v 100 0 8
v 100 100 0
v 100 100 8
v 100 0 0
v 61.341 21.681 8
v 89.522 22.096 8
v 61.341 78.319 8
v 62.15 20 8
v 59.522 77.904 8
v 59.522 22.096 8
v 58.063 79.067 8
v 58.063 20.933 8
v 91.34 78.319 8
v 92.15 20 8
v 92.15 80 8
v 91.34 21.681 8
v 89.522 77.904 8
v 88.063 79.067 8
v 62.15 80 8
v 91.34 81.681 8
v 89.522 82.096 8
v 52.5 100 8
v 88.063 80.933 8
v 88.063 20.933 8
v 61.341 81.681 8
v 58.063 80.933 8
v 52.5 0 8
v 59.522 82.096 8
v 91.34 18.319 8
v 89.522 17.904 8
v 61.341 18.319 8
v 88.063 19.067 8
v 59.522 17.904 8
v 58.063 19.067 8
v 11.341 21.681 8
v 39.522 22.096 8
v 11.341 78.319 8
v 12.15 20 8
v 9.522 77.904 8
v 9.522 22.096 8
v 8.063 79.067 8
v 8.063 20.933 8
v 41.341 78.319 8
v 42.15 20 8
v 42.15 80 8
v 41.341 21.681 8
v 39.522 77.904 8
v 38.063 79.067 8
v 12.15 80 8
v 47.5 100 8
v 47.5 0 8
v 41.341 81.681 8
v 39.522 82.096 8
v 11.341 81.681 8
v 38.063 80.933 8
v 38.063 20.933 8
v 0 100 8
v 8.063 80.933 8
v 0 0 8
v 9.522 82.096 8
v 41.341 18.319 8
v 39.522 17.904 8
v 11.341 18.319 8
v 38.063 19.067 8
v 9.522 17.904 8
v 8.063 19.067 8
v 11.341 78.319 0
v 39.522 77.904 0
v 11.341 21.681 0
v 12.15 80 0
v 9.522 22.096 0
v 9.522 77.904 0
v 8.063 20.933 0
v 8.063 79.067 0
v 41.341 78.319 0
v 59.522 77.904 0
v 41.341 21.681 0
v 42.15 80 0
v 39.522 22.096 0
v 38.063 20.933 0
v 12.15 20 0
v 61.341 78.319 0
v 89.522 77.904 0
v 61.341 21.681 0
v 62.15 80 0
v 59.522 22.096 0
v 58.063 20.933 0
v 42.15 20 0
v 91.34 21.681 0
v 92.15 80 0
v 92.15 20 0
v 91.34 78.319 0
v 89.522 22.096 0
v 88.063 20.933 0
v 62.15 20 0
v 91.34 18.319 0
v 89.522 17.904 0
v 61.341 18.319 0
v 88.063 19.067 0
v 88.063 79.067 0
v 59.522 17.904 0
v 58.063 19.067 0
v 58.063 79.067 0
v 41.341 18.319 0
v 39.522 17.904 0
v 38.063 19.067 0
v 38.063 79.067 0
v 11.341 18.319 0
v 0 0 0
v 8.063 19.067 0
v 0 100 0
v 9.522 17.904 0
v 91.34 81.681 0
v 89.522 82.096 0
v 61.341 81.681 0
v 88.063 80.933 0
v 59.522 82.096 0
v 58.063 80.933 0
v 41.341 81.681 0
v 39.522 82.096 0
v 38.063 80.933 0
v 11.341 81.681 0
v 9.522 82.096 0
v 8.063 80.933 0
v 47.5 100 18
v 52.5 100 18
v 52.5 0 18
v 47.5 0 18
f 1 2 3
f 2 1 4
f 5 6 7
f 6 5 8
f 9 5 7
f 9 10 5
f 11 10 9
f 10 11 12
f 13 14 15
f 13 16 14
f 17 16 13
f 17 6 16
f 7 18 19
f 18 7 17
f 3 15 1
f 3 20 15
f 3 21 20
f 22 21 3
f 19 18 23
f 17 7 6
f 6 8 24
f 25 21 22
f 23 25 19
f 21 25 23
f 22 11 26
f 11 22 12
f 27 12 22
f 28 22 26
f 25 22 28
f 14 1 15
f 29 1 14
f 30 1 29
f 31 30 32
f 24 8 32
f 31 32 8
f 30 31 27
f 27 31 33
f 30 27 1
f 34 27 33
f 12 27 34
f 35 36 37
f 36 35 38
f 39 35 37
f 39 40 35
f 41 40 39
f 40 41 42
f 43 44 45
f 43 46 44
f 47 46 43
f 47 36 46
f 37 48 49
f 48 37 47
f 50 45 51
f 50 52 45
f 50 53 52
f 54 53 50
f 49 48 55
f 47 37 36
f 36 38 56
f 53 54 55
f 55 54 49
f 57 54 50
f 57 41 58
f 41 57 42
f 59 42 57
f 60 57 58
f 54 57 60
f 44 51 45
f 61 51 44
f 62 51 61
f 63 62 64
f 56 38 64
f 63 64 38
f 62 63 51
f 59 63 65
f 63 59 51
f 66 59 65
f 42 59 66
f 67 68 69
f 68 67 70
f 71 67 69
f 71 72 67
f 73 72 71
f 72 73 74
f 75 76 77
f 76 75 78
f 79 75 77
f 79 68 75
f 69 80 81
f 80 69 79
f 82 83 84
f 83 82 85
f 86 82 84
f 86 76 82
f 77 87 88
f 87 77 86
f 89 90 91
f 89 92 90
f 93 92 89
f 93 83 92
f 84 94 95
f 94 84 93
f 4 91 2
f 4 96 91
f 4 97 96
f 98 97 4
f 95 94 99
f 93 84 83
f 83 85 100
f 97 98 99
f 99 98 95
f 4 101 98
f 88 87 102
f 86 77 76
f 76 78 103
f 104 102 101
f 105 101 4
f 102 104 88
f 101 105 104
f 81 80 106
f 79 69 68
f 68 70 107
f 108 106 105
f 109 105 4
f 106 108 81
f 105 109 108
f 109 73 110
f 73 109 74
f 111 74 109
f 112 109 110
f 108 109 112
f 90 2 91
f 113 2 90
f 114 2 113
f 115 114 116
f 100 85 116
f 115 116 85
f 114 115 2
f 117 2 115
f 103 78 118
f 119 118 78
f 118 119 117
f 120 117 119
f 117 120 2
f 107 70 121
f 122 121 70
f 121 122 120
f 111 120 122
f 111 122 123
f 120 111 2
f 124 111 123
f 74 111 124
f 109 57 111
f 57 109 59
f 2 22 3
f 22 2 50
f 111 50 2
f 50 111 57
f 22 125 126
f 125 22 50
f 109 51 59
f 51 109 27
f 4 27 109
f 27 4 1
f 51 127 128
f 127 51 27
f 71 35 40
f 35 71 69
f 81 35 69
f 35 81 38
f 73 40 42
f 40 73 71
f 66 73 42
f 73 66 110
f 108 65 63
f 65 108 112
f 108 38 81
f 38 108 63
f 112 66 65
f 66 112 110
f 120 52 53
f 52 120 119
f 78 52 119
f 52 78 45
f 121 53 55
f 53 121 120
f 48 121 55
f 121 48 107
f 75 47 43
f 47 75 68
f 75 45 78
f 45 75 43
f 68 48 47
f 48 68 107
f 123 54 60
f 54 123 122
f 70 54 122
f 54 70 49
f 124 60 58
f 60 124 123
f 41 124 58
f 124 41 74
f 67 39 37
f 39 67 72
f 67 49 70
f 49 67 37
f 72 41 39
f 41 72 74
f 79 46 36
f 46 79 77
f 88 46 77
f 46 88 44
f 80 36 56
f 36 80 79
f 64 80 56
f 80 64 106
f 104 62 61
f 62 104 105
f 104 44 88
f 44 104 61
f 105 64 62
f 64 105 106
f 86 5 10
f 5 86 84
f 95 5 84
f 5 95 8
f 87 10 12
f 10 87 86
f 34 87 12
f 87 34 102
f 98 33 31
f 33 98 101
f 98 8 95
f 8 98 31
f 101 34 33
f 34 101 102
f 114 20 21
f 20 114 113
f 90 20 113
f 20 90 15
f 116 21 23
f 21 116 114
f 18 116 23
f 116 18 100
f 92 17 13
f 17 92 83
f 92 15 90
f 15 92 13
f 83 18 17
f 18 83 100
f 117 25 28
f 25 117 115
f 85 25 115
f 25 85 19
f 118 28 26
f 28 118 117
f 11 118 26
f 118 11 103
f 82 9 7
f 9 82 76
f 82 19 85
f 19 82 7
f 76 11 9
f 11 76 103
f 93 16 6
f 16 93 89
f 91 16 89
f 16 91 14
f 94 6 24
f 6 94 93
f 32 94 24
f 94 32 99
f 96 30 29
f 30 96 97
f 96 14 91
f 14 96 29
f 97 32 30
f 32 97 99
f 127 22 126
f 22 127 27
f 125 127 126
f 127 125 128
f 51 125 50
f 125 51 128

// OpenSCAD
w = 100;
l = 100;
s = 5;
h = 10;
s2 = 8;

shr = (4+0.3)/2;

difference() {
    cube([l,w,s2]);

    translate([l*0.1,w*0.2,0]) cylinder(s2,shr,shr);
    translate([l*0.4,w*0.8,0]) cylinder(s2,shr,shr);
    translate([l*0.1,w*0.8,0]) cylinder(s2,shr,shr);
    translate([l*0.4,w*0.2,0]) cylinder(s2,shr,shr);



    translate([l*0.6,w*0.2,0]) cylinder(s2,shr,shr);
    translate([l*0.9,w*0.8,0]) cylinder(s2,shr,shr);
    translate([l*0.6,w*0.8,0]) cylinder(s2,shr,shr);
    translate([l*0.9,w*0.2,0]) cylinder(s2,shr,shr);
}

translate([l/2-s/2,0,s2]) cube([s,w,h]);
